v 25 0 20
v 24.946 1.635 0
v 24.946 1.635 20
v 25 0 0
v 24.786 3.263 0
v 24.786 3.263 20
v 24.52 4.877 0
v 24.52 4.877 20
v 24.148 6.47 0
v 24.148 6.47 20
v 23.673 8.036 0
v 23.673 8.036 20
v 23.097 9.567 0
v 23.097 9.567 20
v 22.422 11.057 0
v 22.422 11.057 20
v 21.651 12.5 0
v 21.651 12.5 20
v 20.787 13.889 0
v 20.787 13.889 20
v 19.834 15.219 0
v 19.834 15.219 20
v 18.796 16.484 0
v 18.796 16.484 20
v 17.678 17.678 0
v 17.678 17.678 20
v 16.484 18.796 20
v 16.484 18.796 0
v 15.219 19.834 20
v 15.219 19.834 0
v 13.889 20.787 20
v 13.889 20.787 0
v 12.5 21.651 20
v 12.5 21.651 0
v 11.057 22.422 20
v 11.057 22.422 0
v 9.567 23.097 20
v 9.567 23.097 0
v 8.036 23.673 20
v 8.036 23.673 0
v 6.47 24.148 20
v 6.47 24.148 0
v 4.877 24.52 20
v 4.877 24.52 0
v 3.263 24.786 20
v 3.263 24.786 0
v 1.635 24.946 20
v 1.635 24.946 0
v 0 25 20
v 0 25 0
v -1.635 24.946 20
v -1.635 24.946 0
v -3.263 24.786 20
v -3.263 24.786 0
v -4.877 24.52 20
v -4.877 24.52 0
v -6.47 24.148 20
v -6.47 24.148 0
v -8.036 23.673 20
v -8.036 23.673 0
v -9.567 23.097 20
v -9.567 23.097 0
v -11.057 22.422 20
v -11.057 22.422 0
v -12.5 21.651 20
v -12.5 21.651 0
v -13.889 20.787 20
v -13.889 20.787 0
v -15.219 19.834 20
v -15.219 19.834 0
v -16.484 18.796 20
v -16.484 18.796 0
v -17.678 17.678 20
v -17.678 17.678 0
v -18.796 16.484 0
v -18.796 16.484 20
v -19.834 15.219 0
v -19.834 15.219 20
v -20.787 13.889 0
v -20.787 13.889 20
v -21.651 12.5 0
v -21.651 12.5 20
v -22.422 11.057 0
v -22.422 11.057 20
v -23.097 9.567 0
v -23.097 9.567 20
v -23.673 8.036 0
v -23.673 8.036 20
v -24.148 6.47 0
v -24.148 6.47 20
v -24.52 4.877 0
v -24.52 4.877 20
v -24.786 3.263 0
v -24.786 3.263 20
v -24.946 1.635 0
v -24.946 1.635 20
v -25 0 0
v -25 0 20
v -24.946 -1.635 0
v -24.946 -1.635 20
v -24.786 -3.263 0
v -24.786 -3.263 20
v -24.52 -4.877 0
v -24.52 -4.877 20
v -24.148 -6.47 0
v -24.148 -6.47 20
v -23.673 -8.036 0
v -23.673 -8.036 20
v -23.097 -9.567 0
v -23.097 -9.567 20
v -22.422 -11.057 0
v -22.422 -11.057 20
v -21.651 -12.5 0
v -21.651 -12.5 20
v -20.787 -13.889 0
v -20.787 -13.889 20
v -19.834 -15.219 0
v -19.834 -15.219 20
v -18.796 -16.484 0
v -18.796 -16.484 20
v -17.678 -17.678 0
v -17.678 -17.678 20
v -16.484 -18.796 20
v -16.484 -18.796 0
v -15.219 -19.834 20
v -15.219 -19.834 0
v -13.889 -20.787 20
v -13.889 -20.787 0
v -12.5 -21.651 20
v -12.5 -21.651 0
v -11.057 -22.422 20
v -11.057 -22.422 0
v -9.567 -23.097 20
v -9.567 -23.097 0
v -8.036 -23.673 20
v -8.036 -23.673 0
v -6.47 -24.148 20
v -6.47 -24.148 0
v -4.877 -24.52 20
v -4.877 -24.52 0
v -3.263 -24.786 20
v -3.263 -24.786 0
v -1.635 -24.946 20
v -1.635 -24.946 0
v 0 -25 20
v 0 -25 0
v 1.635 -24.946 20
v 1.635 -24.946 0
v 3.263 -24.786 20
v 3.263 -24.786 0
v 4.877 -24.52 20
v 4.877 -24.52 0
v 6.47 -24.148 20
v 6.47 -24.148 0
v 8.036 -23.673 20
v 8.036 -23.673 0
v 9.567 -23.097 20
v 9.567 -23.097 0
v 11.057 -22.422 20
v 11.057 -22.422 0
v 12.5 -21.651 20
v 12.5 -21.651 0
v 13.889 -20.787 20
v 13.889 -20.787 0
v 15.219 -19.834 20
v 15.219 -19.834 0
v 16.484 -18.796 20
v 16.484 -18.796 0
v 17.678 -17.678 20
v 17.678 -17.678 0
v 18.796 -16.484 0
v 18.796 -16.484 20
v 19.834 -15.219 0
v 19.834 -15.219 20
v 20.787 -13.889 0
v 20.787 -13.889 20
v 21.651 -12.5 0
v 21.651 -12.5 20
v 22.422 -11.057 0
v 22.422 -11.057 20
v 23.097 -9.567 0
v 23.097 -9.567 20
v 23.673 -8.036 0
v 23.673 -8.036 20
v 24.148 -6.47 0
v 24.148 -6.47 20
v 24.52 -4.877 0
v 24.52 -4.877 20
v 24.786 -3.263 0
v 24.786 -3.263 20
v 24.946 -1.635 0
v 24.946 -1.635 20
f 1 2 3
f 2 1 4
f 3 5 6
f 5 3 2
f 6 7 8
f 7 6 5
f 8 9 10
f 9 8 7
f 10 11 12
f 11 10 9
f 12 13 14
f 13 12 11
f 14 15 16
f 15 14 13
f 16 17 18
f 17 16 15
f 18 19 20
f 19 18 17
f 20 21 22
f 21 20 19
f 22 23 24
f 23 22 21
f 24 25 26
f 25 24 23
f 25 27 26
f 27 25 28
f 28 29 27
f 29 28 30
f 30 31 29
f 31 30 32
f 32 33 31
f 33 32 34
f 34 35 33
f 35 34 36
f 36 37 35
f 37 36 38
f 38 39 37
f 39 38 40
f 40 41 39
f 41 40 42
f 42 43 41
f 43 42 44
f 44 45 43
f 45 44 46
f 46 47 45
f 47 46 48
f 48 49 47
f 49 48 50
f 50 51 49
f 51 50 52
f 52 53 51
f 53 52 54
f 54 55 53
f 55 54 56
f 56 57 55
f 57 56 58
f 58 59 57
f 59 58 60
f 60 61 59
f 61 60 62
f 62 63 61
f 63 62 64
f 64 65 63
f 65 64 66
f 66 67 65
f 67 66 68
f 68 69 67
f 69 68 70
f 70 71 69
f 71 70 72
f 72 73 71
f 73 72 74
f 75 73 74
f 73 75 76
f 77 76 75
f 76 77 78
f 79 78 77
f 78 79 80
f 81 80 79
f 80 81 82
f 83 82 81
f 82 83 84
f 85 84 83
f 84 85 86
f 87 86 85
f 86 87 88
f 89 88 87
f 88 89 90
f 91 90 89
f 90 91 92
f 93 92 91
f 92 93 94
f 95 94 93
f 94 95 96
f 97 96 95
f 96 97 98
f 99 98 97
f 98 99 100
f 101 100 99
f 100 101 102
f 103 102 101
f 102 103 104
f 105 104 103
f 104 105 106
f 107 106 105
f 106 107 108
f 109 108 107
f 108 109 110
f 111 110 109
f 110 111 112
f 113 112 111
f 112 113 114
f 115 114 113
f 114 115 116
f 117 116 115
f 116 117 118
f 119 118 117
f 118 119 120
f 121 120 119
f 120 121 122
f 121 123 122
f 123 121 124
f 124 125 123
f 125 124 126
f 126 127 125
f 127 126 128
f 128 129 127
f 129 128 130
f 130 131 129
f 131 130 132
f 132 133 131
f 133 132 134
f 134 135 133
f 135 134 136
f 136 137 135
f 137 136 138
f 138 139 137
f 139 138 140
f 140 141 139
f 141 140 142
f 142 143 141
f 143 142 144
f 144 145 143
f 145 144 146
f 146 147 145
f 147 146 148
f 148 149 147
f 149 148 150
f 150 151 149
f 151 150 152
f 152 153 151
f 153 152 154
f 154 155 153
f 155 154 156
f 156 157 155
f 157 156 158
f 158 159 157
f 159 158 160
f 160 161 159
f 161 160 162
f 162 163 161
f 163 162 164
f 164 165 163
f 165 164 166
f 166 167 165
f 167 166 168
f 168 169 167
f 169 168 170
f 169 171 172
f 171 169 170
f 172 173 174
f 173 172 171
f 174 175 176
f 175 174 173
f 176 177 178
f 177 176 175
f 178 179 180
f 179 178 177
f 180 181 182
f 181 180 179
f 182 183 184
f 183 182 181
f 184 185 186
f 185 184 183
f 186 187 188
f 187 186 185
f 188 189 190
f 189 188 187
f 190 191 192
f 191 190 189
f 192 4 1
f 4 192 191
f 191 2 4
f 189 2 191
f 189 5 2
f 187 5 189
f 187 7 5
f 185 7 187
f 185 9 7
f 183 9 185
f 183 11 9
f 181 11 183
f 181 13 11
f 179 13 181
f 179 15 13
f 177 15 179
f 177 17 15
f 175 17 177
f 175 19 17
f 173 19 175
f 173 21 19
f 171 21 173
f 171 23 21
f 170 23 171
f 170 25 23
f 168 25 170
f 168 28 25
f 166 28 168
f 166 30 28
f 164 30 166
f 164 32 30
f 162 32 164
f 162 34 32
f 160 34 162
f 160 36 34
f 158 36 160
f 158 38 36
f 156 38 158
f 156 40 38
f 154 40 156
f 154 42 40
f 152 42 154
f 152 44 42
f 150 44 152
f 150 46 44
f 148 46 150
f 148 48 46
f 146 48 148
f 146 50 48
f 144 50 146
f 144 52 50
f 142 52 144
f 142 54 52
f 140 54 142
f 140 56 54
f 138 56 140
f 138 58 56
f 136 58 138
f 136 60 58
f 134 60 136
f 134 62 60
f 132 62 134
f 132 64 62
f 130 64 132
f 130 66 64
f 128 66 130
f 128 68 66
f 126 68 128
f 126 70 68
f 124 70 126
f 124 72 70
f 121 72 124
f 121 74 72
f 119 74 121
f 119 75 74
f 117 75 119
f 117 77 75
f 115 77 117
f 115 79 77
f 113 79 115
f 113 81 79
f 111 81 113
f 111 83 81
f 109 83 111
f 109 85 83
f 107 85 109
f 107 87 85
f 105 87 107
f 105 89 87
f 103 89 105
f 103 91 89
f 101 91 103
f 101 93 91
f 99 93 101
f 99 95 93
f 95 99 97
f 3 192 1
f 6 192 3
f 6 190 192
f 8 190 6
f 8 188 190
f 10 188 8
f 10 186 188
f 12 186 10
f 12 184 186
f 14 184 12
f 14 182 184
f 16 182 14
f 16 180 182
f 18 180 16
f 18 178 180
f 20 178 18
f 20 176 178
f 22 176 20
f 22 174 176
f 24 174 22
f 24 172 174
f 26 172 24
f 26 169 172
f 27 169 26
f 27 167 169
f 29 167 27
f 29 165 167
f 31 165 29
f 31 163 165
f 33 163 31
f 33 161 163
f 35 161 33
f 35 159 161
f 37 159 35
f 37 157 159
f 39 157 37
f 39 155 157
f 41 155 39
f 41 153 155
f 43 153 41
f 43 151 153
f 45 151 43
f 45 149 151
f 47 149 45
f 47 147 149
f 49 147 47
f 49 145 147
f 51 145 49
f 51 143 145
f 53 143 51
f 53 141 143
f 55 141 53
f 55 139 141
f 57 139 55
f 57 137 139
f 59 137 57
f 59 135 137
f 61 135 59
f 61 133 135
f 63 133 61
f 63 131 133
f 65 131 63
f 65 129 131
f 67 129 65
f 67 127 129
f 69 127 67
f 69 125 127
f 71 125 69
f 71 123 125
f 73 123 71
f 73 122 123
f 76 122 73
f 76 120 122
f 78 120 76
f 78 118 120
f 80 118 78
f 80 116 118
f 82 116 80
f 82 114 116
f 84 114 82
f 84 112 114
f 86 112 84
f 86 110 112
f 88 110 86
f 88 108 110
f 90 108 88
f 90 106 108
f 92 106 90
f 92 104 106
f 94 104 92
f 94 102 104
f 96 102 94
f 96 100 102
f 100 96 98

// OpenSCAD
// Auto-generated from tests/data/feature_fixtures_manifest.json
// fixture: cylinder_large_diameter
// fixture_type: cylinder
// description: Large-diameter cylinder (d=50) stressing the cylinder/plate boundary at scale.
$fn = 96;

diameter = 50.000000;
height = 20.000000;

cylinder(h=height, d=diameter, center=false);
